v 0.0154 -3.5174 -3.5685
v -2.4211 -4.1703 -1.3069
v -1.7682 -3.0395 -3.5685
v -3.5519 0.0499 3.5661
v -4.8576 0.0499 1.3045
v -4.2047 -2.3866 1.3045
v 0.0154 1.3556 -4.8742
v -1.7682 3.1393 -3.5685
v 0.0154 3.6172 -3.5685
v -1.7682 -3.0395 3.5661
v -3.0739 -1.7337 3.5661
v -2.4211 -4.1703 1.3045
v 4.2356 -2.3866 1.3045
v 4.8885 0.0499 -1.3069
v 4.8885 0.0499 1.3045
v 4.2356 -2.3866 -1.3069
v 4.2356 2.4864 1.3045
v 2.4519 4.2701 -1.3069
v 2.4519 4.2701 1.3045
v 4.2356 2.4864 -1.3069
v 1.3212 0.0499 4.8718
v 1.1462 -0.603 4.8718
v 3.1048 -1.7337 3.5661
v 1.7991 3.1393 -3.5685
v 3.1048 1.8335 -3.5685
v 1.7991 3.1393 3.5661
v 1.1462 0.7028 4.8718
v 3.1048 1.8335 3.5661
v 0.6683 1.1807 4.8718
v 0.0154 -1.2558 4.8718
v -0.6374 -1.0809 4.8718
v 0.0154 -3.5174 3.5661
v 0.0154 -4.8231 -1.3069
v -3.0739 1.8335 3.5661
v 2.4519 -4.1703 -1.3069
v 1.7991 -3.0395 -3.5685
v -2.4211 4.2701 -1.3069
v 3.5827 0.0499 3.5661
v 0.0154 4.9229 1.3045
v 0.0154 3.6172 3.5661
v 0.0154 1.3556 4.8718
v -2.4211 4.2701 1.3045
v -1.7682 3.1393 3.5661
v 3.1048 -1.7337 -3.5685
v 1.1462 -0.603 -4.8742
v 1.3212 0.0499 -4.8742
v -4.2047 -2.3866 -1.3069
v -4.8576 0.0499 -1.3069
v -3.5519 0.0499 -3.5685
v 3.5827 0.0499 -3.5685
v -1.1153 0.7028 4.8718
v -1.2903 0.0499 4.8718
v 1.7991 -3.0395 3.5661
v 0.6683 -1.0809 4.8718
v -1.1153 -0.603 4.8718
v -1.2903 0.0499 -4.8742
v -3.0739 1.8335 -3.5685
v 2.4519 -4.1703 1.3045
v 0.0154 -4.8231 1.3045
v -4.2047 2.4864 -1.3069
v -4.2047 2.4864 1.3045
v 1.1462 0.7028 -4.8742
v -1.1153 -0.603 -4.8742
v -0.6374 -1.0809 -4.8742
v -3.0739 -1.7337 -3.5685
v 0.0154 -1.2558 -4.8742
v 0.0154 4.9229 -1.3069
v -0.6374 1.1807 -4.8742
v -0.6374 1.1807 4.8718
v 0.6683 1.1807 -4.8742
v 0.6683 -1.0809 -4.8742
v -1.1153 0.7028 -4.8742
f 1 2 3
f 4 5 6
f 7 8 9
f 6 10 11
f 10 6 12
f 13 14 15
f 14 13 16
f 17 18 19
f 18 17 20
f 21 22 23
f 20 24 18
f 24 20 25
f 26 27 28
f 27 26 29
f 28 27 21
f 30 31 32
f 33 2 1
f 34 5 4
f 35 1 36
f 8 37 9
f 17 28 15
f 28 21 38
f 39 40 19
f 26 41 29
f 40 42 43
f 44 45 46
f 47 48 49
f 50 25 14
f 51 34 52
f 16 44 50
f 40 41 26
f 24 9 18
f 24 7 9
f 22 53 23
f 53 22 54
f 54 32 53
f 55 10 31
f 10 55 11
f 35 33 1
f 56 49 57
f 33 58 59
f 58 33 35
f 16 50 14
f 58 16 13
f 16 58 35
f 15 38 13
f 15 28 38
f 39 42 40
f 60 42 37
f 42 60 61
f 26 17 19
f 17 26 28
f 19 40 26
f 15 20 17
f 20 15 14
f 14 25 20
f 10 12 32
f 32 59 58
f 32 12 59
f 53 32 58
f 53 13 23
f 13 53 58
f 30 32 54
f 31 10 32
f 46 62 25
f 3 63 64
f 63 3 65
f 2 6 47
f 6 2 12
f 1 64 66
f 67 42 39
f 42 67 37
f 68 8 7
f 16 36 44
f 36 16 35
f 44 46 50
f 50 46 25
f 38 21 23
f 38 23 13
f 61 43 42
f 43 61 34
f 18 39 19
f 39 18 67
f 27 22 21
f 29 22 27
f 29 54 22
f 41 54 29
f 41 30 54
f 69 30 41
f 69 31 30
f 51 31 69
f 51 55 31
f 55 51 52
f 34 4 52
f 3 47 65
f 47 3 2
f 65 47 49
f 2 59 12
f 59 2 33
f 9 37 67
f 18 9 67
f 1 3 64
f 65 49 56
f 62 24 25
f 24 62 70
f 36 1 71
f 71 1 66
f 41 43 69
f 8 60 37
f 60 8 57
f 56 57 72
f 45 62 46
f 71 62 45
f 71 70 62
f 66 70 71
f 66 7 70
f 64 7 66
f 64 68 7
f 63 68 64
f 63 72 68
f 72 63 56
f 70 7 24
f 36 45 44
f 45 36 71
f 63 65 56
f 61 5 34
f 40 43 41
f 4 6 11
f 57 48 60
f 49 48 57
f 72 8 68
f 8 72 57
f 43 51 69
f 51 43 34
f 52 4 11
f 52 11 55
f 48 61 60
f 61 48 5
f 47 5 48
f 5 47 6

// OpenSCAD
// Begin.
union() {
translate([0.01544, 0.0499, -0.00119])
sphere(r = 5.04492, $fn = 12);

translate([0.01544, 0.0499, -0.00119])
sphere(r = 5.04492, $fn = 12);
}
// End.
